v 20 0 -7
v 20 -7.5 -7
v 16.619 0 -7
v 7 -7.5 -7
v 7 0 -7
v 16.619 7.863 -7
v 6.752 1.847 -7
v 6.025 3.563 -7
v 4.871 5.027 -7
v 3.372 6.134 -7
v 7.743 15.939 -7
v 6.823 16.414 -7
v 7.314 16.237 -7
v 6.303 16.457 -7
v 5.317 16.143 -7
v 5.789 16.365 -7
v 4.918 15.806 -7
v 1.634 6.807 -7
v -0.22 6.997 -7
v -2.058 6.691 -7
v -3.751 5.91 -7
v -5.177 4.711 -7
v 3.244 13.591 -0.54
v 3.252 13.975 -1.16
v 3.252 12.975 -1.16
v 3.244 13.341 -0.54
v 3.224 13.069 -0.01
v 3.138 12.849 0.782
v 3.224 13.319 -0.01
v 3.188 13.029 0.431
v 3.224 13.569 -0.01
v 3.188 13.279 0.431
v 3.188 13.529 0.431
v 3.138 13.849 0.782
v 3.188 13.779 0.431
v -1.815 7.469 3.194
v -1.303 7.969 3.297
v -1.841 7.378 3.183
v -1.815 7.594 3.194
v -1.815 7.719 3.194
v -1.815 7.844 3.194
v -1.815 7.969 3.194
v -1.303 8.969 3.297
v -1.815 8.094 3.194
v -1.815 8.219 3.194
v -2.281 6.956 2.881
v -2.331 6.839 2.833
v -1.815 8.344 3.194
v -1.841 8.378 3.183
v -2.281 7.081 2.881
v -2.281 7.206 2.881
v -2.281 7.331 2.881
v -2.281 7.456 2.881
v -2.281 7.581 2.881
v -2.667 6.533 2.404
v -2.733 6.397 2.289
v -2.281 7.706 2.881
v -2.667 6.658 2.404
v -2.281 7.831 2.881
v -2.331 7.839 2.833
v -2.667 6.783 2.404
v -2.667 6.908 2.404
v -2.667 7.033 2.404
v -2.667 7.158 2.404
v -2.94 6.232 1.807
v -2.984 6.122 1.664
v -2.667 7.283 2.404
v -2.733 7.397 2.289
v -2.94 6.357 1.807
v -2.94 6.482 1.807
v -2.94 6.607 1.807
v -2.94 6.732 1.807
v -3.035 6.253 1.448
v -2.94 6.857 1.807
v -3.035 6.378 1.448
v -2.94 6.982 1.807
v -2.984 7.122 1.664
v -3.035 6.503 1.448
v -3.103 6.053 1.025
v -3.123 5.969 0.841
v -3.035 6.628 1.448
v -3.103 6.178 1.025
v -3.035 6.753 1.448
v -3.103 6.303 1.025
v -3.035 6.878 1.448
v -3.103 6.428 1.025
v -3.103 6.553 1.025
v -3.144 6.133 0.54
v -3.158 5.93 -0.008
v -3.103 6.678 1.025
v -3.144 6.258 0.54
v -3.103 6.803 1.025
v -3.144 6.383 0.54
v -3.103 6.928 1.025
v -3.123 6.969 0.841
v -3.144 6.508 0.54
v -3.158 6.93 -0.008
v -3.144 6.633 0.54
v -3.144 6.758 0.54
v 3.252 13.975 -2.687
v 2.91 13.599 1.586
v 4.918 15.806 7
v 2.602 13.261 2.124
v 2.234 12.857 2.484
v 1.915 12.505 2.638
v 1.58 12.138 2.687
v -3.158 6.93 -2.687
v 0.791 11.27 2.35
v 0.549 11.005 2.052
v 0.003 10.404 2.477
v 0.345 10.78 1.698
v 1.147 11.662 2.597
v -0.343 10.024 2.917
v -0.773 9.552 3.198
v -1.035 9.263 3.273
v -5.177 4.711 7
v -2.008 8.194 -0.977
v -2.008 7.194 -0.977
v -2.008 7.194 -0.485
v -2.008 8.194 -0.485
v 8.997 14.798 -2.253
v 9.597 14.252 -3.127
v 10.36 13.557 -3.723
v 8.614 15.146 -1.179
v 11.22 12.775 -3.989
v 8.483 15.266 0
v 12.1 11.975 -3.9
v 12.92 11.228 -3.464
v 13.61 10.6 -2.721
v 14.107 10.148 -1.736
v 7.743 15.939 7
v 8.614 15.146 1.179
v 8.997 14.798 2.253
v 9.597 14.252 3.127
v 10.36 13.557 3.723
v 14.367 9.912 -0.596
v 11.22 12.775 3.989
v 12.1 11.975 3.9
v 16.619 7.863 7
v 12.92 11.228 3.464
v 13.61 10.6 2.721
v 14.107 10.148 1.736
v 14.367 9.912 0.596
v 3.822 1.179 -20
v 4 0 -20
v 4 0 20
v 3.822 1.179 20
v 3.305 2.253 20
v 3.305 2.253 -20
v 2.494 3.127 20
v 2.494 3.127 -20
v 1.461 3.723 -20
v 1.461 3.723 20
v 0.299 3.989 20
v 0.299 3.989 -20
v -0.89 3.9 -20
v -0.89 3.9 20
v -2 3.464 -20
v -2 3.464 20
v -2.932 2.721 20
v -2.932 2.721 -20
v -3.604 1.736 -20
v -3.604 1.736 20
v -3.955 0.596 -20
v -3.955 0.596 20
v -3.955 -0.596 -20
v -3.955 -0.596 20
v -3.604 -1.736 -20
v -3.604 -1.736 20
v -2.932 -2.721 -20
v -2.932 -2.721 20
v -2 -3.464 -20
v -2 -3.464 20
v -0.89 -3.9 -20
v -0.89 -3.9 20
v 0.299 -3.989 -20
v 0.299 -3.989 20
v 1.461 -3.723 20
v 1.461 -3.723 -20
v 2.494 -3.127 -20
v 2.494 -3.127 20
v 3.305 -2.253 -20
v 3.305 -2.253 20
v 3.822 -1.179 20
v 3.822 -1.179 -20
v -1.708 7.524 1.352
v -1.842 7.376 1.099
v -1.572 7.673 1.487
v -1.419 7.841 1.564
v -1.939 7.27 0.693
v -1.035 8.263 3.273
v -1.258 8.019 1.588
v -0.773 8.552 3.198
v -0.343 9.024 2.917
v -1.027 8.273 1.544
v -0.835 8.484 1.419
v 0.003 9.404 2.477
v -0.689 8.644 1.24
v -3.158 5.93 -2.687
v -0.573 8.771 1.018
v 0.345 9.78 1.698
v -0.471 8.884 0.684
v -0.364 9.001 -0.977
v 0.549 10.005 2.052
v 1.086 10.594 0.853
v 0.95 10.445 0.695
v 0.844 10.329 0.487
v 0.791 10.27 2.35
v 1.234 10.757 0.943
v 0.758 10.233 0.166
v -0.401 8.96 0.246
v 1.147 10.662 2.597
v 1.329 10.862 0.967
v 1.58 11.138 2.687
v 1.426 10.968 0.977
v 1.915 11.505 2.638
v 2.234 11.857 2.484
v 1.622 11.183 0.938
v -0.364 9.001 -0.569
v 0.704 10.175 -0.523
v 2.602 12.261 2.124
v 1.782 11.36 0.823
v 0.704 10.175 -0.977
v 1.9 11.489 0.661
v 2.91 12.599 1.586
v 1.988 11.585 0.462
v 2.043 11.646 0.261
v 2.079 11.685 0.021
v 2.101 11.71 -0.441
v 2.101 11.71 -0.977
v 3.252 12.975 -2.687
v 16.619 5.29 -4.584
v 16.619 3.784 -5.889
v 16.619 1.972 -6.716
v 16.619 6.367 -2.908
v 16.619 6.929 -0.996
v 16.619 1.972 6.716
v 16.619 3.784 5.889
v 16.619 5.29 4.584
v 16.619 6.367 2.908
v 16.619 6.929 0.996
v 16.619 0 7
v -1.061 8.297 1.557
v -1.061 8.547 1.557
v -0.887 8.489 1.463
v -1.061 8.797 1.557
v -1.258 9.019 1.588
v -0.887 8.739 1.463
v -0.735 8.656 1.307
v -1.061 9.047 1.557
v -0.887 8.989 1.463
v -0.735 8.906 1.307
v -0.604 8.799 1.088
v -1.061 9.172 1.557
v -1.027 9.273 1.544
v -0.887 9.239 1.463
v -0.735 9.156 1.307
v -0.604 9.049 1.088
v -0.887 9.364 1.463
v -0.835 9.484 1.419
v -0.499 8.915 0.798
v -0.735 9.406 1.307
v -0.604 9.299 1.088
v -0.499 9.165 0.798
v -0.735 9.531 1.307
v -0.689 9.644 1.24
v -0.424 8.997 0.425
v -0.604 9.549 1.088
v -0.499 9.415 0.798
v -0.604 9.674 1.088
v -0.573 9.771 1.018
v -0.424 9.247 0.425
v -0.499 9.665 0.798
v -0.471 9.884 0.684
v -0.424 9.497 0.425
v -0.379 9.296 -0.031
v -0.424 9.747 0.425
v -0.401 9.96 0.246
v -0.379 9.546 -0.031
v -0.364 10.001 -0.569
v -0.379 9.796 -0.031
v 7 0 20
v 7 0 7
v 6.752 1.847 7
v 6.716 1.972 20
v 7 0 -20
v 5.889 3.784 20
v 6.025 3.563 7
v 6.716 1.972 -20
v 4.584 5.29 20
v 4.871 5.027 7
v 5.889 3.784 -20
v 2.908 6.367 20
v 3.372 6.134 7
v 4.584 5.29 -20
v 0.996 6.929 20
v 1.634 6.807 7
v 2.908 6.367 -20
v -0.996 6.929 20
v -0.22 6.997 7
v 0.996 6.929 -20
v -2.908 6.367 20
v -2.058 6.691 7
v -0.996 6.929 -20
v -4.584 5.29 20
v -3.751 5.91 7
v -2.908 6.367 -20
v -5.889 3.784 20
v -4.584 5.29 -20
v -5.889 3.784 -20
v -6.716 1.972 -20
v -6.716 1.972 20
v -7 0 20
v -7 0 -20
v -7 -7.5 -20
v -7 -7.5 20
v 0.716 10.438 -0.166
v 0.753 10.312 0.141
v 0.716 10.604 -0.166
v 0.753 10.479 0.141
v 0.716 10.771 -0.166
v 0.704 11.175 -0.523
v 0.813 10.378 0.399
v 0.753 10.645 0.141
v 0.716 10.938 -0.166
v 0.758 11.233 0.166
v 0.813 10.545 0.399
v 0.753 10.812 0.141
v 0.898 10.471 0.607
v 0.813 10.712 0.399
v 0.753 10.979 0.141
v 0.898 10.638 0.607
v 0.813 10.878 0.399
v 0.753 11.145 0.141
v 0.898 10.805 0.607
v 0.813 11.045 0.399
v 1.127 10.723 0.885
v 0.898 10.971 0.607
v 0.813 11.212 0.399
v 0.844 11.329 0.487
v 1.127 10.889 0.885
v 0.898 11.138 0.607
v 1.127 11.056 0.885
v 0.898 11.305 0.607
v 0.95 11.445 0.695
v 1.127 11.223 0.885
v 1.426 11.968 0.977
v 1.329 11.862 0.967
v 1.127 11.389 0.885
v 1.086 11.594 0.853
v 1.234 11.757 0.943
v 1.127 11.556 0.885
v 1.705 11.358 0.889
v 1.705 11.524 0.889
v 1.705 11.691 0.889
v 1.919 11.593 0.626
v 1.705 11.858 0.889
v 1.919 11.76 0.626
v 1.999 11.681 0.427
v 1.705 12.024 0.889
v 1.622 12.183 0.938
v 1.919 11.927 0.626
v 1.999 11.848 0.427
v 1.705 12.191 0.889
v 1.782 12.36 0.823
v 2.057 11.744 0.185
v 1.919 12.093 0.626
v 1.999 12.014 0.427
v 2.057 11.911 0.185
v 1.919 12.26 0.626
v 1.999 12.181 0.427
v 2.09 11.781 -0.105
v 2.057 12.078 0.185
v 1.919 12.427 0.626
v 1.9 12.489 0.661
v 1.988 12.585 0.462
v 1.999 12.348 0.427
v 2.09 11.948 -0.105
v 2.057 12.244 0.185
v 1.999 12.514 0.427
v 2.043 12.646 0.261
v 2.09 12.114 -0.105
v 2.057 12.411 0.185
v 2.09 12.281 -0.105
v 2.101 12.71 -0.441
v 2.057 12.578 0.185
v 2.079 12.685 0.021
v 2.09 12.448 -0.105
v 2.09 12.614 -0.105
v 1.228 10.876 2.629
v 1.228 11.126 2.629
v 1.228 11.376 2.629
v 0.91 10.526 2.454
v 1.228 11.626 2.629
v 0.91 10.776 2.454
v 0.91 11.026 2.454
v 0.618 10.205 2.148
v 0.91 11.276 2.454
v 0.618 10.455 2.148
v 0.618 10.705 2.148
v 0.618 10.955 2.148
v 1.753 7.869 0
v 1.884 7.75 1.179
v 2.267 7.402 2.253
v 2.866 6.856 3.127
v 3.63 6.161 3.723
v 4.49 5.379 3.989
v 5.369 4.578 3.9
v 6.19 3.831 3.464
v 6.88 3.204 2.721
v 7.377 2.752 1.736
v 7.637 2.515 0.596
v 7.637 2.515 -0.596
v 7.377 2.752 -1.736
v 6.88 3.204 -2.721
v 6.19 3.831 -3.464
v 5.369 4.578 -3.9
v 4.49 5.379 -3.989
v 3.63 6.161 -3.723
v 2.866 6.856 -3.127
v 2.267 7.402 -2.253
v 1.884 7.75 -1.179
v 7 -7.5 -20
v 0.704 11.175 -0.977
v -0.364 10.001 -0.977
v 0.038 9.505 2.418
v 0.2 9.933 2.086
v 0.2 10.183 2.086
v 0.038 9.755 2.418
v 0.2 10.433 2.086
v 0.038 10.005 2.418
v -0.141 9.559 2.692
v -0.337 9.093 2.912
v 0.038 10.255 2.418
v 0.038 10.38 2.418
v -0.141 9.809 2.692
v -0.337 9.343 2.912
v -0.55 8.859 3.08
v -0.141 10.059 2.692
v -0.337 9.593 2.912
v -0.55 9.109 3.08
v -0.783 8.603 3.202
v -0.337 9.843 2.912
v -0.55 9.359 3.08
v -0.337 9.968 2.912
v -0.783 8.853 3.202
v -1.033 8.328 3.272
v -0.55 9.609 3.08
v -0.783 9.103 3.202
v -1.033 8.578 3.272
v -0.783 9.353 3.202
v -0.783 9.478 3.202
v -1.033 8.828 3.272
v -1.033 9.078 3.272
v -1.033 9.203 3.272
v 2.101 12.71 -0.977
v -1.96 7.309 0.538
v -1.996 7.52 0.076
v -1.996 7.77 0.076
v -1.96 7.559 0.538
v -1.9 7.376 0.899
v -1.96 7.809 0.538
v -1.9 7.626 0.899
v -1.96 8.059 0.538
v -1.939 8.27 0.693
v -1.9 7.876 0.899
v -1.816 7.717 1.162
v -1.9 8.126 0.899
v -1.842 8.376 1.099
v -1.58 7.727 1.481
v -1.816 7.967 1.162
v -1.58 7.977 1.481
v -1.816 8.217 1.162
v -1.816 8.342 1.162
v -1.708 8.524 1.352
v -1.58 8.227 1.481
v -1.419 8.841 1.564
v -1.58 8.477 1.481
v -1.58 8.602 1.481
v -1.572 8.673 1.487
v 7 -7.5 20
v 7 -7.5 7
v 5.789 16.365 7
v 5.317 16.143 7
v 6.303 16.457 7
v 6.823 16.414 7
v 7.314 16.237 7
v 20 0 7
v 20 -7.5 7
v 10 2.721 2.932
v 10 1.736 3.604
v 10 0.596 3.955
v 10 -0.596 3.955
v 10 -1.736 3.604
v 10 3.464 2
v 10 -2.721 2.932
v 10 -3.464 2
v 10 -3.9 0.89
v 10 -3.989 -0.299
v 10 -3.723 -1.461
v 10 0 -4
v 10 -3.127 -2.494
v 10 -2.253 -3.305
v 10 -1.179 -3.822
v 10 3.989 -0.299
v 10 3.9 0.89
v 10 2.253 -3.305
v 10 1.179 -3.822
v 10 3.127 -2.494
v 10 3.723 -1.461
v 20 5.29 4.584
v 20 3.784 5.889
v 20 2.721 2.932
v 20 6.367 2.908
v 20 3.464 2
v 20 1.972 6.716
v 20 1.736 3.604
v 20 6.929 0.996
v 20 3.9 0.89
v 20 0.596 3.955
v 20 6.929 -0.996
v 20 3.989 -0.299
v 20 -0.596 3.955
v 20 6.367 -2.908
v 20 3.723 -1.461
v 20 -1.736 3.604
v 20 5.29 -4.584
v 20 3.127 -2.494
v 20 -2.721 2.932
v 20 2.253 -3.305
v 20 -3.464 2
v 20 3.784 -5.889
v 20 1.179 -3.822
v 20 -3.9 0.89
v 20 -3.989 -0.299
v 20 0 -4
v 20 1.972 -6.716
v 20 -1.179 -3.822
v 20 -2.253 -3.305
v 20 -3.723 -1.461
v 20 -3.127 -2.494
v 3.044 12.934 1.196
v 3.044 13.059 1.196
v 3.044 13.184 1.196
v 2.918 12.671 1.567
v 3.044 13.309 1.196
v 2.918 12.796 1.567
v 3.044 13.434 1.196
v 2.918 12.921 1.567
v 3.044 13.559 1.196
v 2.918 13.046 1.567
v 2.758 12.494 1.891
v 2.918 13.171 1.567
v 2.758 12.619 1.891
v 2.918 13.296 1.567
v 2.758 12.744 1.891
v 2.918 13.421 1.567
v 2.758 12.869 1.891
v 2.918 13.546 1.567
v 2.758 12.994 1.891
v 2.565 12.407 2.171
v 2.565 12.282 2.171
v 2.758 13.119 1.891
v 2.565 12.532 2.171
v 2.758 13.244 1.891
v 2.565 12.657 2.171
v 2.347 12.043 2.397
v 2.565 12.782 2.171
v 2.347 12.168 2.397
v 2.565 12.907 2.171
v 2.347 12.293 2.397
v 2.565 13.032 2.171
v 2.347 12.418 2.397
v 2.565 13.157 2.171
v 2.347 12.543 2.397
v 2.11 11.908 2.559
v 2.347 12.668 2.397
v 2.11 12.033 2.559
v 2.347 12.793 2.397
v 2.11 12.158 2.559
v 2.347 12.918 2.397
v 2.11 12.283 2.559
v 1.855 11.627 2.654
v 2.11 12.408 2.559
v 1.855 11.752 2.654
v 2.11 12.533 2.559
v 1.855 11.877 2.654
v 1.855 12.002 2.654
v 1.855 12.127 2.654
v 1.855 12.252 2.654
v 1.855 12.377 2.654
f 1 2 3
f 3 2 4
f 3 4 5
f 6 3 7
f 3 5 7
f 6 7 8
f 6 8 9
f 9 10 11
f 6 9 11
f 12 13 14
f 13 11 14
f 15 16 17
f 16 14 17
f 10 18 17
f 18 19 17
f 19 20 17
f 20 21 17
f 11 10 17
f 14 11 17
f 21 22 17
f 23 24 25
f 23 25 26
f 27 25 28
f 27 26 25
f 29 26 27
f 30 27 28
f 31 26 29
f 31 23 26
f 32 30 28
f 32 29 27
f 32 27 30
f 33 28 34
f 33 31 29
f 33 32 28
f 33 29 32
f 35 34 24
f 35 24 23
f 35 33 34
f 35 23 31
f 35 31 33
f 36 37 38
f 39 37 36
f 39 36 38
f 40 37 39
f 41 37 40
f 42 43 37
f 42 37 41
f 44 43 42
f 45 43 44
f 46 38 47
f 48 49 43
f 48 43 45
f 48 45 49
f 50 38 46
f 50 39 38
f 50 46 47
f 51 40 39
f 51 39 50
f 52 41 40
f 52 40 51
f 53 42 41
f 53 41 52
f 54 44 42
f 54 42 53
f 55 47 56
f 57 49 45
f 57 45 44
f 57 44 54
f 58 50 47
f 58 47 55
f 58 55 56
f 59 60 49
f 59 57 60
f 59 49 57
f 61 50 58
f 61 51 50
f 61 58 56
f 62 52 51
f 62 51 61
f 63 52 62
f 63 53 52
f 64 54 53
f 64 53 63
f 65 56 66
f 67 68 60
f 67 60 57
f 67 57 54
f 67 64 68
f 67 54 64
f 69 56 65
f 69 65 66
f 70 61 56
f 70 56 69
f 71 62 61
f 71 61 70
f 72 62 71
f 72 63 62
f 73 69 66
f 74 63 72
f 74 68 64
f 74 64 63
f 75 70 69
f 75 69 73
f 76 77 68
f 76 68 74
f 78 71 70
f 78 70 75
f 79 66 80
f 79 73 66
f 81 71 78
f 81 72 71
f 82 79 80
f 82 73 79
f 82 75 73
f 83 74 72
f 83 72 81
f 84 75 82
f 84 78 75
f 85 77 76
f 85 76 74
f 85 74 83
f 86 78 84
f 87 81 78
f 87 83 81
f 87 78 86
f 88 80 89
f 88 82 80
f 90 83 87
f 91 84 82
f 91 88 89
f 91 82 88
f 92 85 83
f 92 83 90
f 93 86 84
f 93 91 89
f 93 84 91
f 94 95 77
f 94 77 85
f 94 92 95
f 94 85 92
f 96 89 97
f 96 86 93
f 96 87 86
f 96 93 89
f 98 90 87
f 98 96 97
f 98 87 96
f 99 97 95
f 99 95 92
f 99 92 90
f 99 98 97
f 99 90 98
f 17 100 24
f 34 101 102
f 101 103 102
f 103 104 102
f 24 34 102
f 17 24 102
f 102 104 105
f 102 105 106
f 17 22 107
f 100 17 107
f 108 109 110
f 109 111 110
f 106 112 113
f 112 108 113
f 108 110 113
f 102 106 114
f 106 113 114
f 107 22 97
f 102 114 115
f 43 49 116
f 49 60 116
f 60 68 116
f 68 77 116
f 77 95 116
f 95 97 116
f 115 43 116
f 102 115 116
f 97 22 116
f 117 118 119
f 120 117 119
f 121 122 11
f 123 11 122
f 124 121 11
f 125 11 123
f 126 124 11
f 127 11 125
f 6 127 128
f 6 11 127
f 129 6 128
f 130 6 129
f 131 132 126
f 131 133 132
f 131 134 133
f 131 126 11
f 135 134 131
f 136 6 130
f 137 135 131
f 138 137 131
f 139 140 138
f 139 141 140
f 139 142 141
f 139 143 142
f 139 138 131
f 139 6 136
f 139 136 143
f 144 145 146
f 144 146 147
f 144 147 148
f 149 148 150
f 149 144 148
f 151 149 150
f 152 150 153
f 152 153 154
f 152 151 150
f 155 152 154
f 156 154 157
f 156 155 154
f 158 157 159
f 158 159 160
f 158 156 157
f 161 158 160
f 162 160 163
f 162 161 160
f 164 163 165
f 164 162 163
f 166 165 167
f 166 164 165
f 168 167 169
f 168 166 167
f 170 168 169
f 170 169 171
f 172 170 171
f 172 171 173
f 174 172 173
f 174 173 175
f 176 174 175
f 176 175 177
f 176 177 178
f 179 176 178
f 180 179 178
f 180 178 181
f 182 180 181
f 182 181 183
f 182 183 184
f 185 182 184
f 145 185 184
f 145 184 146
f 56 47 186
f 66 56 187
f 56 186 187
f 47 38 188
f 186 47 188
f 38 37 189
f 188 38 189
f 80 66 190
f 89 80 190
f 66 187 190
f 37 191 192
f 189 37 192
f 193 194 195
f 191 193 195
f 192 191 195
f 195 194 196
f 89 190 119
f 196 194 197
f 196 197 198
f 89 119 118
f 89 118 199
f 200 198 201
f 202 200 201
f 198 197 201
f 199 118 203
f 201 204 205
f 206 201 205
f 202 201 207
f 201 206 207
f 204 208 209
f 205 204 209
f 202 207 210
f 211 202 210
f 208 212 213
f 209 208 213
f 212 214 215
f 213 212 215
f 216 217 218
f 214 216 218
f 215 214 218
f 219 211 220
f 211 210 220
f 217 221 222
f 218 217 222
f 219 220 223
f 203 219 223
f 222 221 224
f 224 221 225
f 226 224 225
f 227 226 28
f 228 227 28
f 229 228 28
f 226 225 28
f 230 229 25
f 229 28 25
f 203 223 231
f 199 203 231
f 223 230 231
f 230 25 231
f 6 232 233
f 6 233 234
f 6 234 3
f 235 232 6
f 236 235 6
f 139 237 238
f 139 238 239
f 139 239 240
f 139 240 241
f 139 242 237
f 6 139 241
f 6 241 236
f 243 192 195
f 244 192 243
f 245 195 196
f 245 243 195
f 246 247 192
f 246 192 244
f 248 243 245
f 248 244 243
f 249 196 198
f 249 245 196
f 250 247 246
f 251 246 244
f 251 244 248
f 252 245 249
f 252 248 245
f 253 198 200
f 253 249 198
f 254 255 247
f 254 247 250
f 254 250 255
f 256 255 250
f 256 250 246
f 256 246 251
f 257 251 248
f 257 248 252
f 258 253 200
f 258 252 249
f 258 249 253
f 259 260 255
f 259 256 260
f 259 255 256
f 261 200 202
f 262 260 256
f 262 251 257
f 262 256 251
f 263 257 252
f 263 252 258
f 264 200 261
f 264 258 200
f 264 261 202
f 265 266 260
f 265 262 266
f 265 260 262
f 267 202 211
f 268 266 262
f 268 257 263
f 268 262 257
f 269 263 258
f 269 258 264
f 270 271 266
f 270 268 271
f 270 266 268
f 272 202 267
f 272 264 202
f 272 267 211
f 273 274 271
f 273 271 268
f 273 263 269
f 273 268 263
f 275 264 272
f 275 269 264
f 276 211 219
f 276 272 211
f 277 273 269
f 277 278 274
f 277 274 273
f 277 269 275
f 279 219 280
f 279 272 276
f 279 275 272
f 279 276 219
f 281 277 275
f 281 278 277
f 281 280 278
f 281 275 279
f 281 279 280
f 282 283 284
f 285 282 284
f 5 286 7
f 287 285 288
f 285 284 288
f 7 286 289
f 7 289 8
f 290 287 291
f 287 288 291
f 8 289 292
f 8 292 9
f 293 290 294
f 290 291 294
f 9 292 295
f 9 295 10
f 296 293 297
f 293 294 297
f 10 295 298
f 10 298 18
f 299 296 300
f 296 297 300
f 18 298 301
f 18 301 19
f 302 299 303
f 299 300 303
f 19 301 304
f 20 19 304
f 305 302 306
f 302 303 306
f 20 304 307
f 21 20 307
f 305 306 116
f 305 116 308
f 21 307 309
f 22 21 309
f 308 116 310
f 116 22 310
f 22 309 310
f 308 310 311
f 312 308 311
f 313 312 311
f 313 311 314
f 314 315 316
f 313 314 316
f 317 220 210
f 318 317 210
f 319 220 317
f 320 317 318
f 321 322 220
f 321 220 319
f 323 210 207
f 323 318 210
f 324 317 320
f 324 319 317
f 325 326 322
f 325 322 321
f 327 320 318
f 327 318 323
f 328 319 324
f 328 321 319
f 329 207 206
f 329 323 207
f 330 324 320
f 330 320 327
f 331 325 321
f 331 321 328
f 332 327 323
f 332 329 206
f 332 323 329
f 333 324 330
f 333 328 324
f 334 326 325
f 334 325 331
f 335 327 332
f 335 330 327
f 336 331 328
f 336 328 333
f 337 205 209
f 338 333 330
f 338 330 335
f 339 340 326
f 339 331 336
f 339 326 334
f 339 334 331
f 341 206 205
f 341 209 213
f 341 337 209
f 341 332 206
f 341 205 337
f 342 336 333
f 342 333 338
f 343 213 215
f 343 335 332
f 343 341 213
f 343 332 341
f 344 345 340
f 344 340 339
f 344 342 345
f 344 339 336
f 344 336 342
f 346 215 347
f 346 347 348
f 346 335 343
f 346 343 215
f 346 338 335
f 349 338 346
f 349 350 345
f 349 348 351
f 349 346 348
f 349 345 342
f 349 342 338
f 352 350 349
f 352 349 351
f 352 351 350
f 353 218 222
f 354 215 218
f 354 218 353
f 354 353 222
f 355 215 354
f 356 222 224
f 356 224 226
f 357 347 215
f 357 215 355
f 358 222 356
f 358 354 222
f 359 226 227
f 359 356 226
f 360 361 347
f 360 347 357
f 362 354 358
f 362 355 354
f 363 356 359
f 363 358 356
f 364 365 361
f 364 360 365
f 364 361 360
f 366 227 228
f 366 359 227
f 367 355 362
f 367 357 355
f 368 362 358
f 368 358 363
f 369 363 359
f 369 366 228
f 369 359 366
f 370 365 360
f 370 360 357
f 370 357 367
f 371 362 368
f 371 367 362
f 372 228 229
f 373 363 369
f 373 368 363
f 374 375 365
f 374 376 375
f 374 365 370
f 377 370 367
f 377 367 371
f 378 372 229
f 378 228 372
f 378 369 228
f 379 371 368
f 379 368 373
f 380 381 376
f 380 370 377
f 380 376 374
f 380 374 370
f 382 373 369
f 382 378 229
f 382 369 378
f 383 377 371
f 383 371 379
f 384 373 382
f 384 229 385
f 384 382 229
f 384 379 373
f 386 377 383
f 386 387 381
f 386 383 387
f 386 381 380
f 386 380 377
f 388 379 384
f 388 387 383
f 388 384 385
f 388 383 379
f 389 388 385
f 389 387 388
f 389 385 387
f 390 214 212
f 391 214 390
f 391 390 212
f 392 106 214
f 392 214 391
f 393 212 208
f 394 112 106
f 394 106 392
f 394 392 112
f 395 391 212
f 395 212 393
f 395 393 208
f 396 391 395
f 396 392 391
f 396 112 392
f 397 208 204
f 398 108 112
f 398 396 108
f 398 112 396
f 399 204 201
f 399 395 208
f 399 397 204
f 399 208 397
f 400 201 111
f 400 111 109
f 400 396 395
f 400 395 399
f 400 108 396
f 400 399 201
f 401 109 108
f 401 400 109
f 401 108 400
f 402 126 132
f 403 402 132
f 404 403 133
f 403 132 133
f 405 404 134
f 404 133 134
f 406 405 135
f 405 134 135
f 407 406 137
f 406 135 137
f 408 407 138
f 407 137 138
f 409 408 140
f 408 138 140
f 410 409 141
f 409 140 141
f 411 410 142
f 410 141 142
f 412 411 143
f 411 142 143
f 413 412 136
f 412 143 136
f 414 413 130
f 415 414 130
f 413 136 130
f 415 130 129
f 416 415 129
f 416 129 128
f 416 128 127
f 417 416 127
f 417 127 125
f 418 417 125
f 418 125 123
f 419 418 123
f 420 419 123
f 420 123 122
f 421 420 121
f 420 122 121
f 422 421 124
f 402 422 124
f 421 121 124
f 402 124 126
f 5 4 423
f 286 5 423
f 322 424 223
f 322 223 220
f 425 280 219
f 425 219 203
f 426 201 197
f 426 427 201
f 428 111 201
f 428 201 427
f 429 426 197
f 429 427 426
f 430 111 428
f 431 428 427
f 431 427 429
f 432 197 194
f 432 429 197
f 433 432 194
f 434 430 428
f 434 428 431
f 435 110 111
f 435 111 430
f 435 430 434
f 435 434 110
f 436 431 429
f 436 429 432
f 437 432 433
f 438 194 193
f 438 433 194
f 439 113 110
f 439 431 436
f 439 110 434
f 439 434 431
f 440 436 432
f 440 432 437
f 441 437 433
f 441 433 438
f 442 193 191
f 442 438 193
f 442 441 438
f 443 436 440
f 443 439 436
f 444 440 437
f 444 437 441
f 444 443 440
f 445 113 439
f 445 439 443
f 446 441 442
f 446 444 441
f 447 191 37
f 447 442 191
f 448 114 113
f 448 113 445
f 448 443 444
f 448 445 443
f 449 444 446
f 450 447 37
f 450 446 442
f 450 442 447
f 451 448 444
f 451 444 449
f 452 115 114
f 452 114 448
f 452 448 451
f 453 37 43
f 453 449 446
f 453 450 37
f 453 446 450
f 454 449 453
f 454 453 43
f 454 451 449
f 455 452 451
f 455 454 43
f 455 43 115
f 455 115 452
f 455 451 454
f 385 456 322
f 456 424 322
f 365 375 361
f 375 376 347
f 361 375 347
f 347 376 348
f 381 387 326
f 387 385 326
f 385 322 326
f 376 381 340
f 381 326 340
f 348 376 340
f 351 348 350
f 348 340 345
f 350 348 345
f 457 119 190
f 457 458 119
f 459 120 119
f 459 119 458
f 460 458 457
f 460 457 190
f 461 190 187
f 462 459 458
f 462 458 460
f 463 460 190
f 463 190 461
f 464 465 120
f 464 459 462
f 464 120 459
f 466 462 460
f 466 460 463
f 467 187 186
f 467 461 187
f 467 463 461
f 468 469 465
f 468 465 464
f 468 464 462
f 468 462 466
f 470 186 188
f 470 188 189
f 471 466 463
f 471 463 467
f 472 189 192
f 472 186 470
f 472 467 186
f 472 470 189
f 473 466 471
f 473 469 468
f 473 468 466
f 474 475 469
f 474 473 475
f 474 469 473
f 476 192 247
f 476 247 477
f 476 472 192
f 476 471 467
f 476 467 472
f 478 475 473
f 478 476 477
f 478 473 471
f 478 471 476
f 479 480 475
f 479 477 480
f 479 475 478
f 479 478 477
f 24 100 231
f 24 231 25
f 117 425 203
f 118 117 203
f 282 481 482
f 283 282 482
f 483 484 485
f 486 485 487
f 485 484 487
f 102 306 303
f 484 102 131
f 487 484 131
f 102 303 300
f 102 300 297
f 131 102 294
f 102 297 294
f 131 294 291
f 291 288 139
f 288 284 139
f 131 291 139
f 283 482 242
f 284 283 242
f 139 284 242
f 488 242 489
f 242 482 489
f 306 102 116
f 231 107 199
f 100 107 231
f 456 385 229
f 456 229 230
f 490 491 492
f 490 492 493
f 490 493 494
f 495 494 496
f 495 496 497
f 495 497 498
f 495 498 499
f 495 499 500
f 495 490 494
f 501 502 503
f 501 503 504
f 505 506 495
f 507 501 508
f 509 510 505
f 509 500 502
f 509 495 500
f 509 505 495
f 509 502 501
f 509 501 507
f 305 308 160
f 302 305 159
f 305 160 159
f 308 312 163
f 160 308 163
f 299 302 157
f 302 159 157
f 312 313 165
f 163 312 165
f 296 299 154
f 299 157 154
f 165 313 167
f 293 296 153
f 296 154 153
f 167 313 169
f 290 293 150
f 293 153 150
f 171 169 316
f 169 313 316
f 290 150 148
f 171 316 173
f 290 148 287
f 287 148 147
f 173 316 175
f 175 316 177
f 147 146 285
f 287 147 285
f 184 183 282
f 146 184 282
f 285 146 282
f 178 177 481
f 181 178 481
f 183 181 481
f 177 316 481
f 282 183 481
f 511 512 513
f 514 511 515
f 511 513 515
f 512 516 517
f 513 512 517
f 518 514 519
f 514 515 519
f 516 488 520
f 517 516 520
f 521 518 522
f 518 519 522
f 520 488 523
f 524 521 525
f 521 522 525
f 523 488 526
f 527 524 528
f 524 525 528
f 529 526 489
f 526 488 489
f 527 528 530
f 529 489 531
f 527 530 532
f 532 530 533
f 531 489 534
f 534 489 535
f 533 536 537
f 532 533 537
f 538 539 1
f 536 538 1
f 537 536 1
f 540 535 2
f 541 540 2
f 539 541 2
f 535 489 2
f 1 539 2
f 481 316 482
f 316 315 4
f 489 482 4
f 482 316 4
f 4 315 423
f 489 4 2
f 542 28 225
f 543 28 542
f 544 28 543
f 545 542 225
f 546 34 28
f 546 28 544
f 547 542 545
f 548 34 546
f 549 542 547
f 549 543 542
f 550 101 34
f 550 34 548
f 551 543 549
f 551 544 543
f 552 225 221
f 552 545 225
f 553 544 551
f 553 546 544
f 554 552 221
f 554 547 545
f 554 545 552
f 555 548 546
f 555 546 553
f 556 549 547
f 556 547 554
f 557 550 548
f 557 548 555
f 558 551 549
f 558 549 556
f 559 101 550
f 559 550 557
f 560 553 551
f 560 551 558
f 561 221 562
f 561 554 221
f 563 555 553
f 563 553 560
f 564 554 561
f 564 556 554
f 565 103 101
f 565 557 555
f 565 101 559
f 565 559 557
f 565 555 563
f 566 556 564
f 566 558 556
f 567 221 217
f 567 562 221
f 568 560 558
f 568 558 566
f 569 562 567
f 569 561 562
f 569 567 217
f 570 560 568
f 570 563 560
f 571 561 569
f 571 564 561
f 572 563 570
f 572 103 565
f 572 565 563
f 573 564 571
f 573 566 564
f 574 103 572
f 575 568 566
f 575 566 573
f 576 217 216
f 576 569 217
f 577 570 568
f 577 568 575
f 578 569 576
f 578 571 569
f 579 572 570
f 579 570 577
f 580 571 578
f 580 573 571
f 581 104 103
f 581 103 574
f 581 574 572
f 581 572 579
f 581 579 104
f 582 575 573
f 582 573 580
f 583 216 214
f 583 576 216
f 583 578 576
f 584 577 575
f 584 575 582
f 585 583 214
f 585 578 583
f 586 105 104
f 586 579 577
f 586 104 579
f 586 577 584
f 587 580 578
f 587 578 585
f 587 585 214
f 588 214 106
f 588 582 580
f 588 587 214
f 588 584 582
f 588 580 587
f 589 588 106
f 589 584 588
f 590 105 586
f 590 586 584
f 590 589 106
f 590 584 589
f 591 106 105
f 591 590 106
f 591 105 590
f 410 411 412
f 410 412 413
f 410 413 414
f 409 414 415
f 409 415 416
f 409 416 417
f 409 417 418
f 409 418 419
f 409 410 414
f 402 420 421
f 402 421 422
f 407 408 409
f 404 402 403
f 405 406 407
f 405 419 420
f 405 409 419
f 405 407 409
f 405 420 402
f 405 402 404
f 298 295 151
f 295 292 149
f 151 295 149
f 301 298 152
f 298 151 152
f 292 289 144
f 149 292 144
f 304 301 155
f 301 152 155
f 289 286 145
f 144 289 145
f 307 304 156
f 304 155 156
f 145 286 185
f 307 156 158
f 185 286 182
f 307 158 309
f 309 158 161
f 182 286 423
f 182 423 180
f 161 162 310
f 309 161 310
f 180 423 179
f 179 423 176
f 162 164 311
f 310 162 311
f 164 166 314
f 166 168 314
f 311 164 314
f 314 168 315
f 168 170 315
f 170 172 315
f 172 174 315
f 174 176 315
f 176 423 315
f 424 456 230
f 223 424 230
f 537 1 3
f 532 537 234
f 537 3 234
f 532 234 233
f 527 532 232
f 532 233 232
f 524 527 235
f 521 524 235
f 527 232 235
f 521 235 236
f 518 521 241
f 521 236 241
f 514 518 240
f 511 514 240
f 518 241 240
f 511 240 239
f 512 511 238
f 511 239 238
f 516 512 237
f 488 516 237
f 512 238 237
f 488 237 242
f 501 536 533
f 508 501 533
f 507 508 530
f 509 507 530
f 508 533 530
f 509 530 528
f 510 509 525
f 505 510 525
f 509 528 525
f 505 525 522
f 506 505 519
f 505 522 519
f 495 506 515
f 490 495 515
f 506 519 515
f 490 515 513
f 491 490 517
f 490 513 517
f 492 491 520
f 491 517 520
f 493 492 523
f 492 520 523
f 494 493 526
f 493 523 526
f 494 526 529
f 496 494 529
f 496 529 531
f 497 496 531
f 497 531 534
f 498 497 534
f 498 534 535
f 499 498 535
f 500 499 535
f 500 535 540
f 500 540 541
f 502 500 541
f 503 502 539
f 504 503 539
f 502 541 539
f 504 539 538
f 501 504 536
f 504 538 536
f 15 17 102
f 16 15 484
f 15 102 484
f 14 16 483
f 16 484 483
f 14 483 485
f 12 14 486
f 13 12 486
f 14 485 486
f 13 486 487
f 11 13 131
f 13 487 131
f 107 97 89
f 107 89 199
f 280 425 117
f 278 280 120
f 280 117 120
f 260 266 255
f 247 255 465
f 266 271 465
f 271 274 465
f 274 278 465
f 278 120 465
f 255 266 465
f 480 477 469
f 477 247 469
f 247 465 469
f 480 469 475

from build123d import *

# Parameters (mm, degrees)
DODANIE_WYCI_GNI_CIE1_DEPTH             = 20
DODANIE_WYCI_GNI_CIE1_DEPTH_BACK        = 20
SZKIC1_R                                = 7
SZKIC1_R_2                              = 4
DODANIE_WYCI_GNI_CIE2_DEPTH             = 10
DODANIE_WYCI_GNI_CIE2_DEPTH_BACK        = 10
SZKIC2_R                                = 4
DODANIE_WYCI_GNI_CIE4_REACH             = 28.181
DODANIE_WYCI_GNI_CIE4_END_RADIUS        = 7
SZKIC3_W                                = 14
SZKIC3_H                                = 14
DODANIE_WYCI_GNI_CIE4_DIRECTION_2_DEPTH = 10
SZKIC9_R                                = 7
DODANIE_WYCI_GNI_CIE6_DEPTH             = 20
DODANIE_WYCI_GNI_CIE5_REACH             = 39.607
SZKIC12_R                               = 4
WYTNIJ_WYCI_GNI_CIE3_DEPTH              = 40.984557912
DODANIE_WYCI_GNI_CIE7_START             = 8
DODANIE_WYCI_GNI_CIE7_DEPTH             = 8.618630395
SZKIC4_R                                = 4
WYTNIJ_WYCI_GNI_CIE1_DEPTH              = 10
SZKIC10_R                               = 4
WYTNIJ_WYCI_GNI_CIE2_DEPTH              = 10
ZAOKR_GLENIE1_R                         = 2
WYTNIJ_WYCI_GNI_CIE4_DEPTH              = 1


with BuildPart() as part:
    # Szkic1 → Dodanie-wyciągnięcie1 (new, two sides: drawn at the far end of the back side and taken through both)
    with BuildSketch(Plane.XY.offset(-DODANIE_WYCI_GNI_CIE1_DEPTH_BACK)):
        Circle(SZKIC1_R)
        Circle(SZKIC1_R_2, mode=Mode.SUBTRACT)
    extrude(amount=DODANIE_WYCI_GNI_CIE1_DEPTH + DODANIE_WYCI_GNI_CIE1_DEPTH_BACK)

    # Szkic2 → Dodanie-wyciągnięcie2 (add, two sides: drawn at the far end of the back side and taken through both)
    with BuildSketch(Plane.XY.offset(-DODANIE_WYCI_GNI_CIE2_DEPTH_BACK)):
        Circle(SZKIC2_R)
    extrude(amount=DODANIE_WYCI_GNI_CIE2_DEPTH + DODANIE_WYCI_GNI_CIE2_DEPTH_BACK)

    # Dodanie-wyciągnięcie4: up to this cylinder (the profile starts outside it)
    dodanie_wyci_gni_cie4_end = Plane(origin=(0, 0, 0), z_dir=(0, 0, 1)) * Cylinder(DODANIE_WYCI_GNI_CIE4_END_RADIUS, 71.362, mode=Mode.PRIVATE)
    # Szkic3 → Dodanie-wyciągnięcie4 (add, up to the surface)
    with BuildSketch(Plane(origin=(4.711087595, 5.177417665, 0), x_dir=(0, 0, 1), z_dir=(0.6730125135097745, 0.7396310949786087, 0)), mode=Mode.PRIVATE) as dodanie_wyci_gni_cie4_sk1:
        Rectangle(SZKIC3_W, SZKIC3_H)
    dodanie_wyci_gni_cie4_tool1 = extrude(dodanie_wyci_gni_cie4_sk1.sketch, amount=-DODANIE_WYCI_GNI_CIE4_REACH, mode=Mode.PRIVATE) - dodanie_wyci_gni_cie4_end
    add(dodanie_wyci_gni_cie4_tool1.solids().sort_by_distance((4.711088, 5.177418, 0))[0])
    add(dodanie_wyci_gni_cie4_tool1.solids().sort_by_distance((4.711088, 5.177418, 0))[1])

    # Szkic3 → Dodanie-wyciągnięcie4 direction 2 (add)
    with BuildSketch(Plane(origin=(4.711087595, 5.177417665, 0), x_dir=(0, 0, 1), z_dir=(0.6730125135097745, 0.7396310949786087, 0))):
        Rectangle(SZKIC3_W, SZKIC3_H)
    extrude(amount=DODANIE_WYCI_GNI_CIE4_DIRECTION_2_DEPTH)

    # Szkic9 → Dodanie-wyciągnięcie6 (add)
    with BuildSketch(Plane(origin=(0, 0, 0), x_dir=(0, 0, -1), z_dir=(1, 0, 0))):
        Circle(SZKIC9_R)
    extrude(amount=DODANIE_WYCI_GNI_CIE6_DEPTH)

    # Szkic8 → Dodanie-wyciągnięcie5 (add, up to next)
    with BuildSketch(Plane(origin=(0, -7.5, 0), x_dir=(1, 0, 0), z_dir=(0, 1, 0)), mode=Mode.PRIVATE) as dodanie_wyci_gni_cie5_sk1:
        Polygon((7, 20), (-7, 20), (-7, -20), (7, -20), (7, -7), (20, -7), (20, 7), (7, 7), align=None)
    dodanie_wyci_gni_cie5_tool1 = extrude(dodanie_wyci_gni_cie5_sk1.sketch, amount=DODANIE_WYCI_GNI_CIE5_REACH, mode=Mode.PRIVATE) - part.part
    add(dodanie_wyci_gni_cie5_tool1.solids().sort_by_distance((3.311321, -7.5, 0))[0])

    # Szkic12 → Wytnij-wyciągnięcie3 (cut, through all)
    with BuildSketch(Plane.XY.offset(10)):
        Circle(SZKIC12_R)
    extrude(amount=-WYTNIJ_WYCI_GNI_CIE3_DEPTH, mode=Mode.SUBTRACT)

    # Dodanie-wyciągnięcie7: read off the stored shape, not the designer's step
    # Dodanie-wyciągnięcie7 outline → Dodanie-wyciągnięcie7 (add)
    with BuildSketch(Plane.YZ.offset(DODANIE_WYCI_GNI_CIE7_START)):
        with BuildLine():
            Line((7.86264102, 7), (0, 7))
            ThreePointArc((0, 7), (7, 0), (0, -7))
            Line((0, -7), (7.86264102, -7))
            Line((7.86264102, -7), (7.86264102, 7))
        make_face()
    extrude(amount=DODANIE_WYCI_GNI_CIE7_DEPTH)

    # Szkic4 → Wytnij-wyciągnięcie1 (cut)
    with BuildSketch(Plane(origin=(11.44121273, 12.573728615, 0), x_dir=(0, 0, -1), z_dir=(0.6730125135097745, 0.7396310949786088, 0))):
        with Locations(Location((0, 0, 0), (0, 0, 90))):
            Circle(SZKIC4_R)
    extrude(amount=-WYTNIJ_WYCI_GNI_CIE1_DEPTH, mode=Mode.SUBTRACT)

    # Szkic10 → Wytnij-wyciągnięcie2 (cut)
    with BuildSketch(Plane(origin=(20, 0, 0), x_dir=(0, 0, -1), z_dir=(1, 0, 0))):
        Circle(SZKIC10_R)
    extrude(amount=-WYTNIJ_WYCI_GNI_CIE2_DEPTH, mode=Mode.SUBTRACT)

    # Zaokrąglenie1
    zaokr_glenie1_edges = [part.edges().sort_by_distance(p)[0] for p in [
        (6.263795065, 17.284816209, 0),
    ]]
    fillet(zaokr_glenie1_edges, radius=ZAOKR_GLENIE1_R)

    # Szkic14 → Wytnij-wyciągnięcie4 (cut, along a direction that is not the sketch's normal)
    with BuildSketch(Plane(origin=(-5.177417665, 4.711087595, 0), x_dir=(0, 0, 1), z_dir=(-0.7396310949786086, 0.6730125135097746, 0))):
        with BuildLine():
            Line((-2.686538462, 3), (-2.686538462, 12.525))
            Line((-2.686538462, 12.525), (-1.160096154, 12.525))
            add(Edge.make_bspline(
                [(-1.160096154, 12.525), (-1.053235648, 12.525012195), (-0.846462595, 12.525035793), (-0.548143042, 12.51455979), (-0.271476851, 12.501007906), (-0.01734448, 12.4858465), (0.214686622, 12.459720367), (0.424263612, 12.432186277), (0.611805228, 12.398981861), (0.727752018, 12.369196471), (0.782301683, 12.355183293)],
                knots=[0, 0, 0, 0, 1.311965854, 2.538629056, 3.664479157, 4.713267157, 5.663616078, 6.530575999, 7.308677837, 8, 8, 8, 8], degree=3))
            add(Edge.make_bspline(
                [(0.782301683, 12.355183293), (0.85393093, 12.335417456), (0.994490509, 12.296630538), (1.195816681, 12.218298682), (1.386802639, 12.131227269), (1.567215194, 12.031895073), (1.735946541, 11.919102874), (1.892355443, 11.79195552), (2.039815254, 11.655556701), (2.173090012, 11.50610502), (2.293548434, 11.348181634), (2.398205206, 11.181827924), (2.489138527, 11.009587547), (2.561909002, 10.829292972), (2.616740188, 10.641774504), (2.656843488, 10.447832876), (2.682835858, 10.24685441), (2.685291796, 10.11012219), (2.686538462, 10.040715144)],
                knots=[0, 0, 0, 0, 1.099996261, 2.158545794, 3.195537121, 4.207578794, 5.205712374, 6.197378256, 7.190519799, 8.17788031, 9.159561366, 10.129234751, 11.085776129, 12.040971148, 13.00380137, 13.975669004, 14.972423361, 16, 16, 16, 16], degree=3))
            add(Edge.make_bspline(
                [(2.686538462, 10.040715144), (2.6832788, 9.951545308), (2.676862558, 9.776025442), (2.635875166, 9.518218515), (2.559017418, 9.274553912), (2.458450925, 9.040540989), (2.321711936, 8.817052614), (2.148079865, 8.604195051), (1.940366984, 8.395414096), (1.781039737, 8.270263996), (1.698167067, 8.205168269)],
                knots=[0, 0, 0, 0, 0.986156485, 1.941127874, 2.875419072, 3.804401753, 4.751181392, 5.761612777, 6.835722519, 8, 8, 8, 8], degree=3))
            add(Edge.make_bspline(
                [(1.698167067, 8.205168269), (1.765323103, 8.170885695), (1.89699751, 8.103667053), (2.083936483, 7.99317967), (2.257021567, 7.875662326), (2.417028822, 7.753479516), (2.560601912, 7.621451735), (2.693669212, 7.487186605), (2.809665872, 7.342991291), (2.913393581, 7.194005189), (3.00355202, 7.038070964), (3.082070078, 6.875451953), (3.148391466, 6.705592614), (3.204554132, 6.529357394), (3.246440263, 6.346140126), (3.273750912, 6.155875284), (3.294661651, 5.959211768), (3.29628831, 5.825249491), (3.297115385, 5.757136418)],
                knots=[0, 0, 0, 0, 1.164658916, 2.283573913, 3.35186032, 4.395461096, 5.390182219, 6.362969632, 7.312859996, 8.245001507, 9.165155236, 10.092416118, 11.032087915, 11.979892451, 12.947605196, 13.931445124, 14.948243989, 16, 16, 16, 16], degree=3))
            add(Edge.make_bspline(
                [(3.297115385, 5.757136418), (3.291748226, 5.627044343), (3.281156159, 5.370308155), (3.203712138, 4.993360467), (3.069448812, 4.63597987), (2.889160851, 4.299586747), (2.667011396, 3.993919126), (2.411603228, 3.726156945), (2.125507722, 3.499502202), (1.861550038, 3.346527834), (1.633247428, 3.243867728), (1.444148642, 3.180396777), (1.241060554, 3.121597384), (1.020263078, 3.080307236), (0.785758971, 3.042513952), (0.535261803, 3.019179595), (0.26923975, 3.003366477), (0.086524304, 3.001144846), (-0.007632212, 3)],
                knots=[0, 0, 0, 0, 1.284142165, 2.534249414, 3.780121997, 5.041676246, 6.291546858, 7.49970053, 8.684500223, 9.883330709, 10.50184324, 11.153274765, 11.851151195, 12.587658647, 13.369265475, 14.195992086, 15.070362669, 16, 16, 16, 16], degree=3))
            Line((-0.007632212, 3), (-2.686538462, 3))
        make_face()
        with BuildLine():
            Line((-0.976923077, 10.815384615), (-0.976923077, 8.739423077))
            Line((-0.976923077, 8.739423077), (-0.52280649, 8.739423077))
            add(Edge.make_bspline(
                [(-0.52280649, 8.739423077), (-0.461087966, 8.739961286), (-0.341944091, 8.741000265), (-0.1698534, 8.754381963), (-0.009836849, 8.77721197), (0.137498653, 8.809065573), (0.273525591, 8.849515004), (0.397374985, 8.898184382), (0.508502292, 8.957566312), (0.63760652, 9.046018318), (0.774079, 9.176179404), (0.894214189, 9.364224061), (0.964973013, 9.580474702), (0.972853637, 9.732991398), (0.976923077, 9.811748798)],
                knots=[0, 0, 0, 0, 1.065314748, 2.056525647, 2.977365736, 3.853934255, 4.656397591, 5.425096493, 6.14721249, 6.826394842, 8.123232004, 9.372140726, 10.643011755, 12, 12, 12, 12], degree=3))
            add(Edge.make_bspline(
                [(0.976923077, 9.811748798), (0.97366678, 9.885518189), (0.967370861, 10.028148341), (0.896125823, 10.228413777), (0.785468194, 10.40588994), (0.654821309, 10.527357859), (0.531791881, 10.610316867), (0.426446534, 10.664941841), (0.310822106, 10.71384156), (0.18268023, 10.751231476), (0.042752669, 10.779287553), (-0.108280873, 10.799891382), (-0.27068098, 10.813915224), (-0.382851079, 10.814884312), (-0.440760216, 10.815384615)],
                knots=[0, 0, 0, 0, 1.347982417, 2.606269829, 3.849316587, 5.153353503, 5.842674298, 6.568177932, 7.326619318, 8.142485038, 9.012069166, 9.942760135, 10.937925643, 12, 12, 12, 12], degree=3))
            Line((-0.440760216, 10.815384615), (-0.976923077, 10.815384615))
        make_face(mode=Mode.SUBTRACT)
        with BuildLine():
            Line((-0.976923077, 7.151923077), (-0.976923077, 4.709615385))
            Line((-0.976923077, 4.709615385), (-0.484645433, 4.709615385))
            add(Edge.make_bspline(
                [(-0.484645433, 4.709615385), (-0.387321516, 4.710171393), (-0.200204141, 4.711240387), (0.067841168, 4.724156384), (0.311561364, 4.747435193), (0.530310682, 4.776496911), (0.724424178, 4.815870993), (0.893245702, 4.865930091), (1.039090422, 4.921003819), (1.161083845, 4.989026413), (1.260745483, 5.068187842), (1.350679663, 5.149092725), (1.424006389, 5.242424151), (1.482023863, 5.344175661), (1.532237884, 5.451819674), (1.562523436, 5.569559649), (1.585581792, 5.693906057), (1.586850755, 5.779913778), (1.5875, 5.823918269)],
                knots=[0, 0, 0, 0, 1.753078804, 3.370512758, 4.83203934, 6.162291463, 7.344201807, 8.395507345, 9.331626367, 10.147333109, 10.898971645, 11.62040215, 12.321813352, 13.025280112, 13.727906689, 14.453419512, 15.208716525, 16, 16, 16, 16], degree=3))
            add(Edge.make_bspline(
                [(1.5875, 5.823918269), (1.586068229, 5.874238098), (1.583279523, 5.972247587), (1.560504132, 6.115498915), (1.519113807, 6.249233534), (1.466980673, 6.37687122), (1.394434648, 6.493842097), (1.308216175, 6.604194086), (1.204042251, 6.704190327), (1.086892595, 6.799878966), (0.95024912, 6.883659553), (0.794047716, 6.956354053), (0.617439814, 7.017065822), (0.41987835, 7.065404572), (0.202229419, 7.106429001), (-0.037095577, 7.130925114), (-0.296103456, 7.14914395), (-0.475703734, 7.150975652), (-0.56859976, 7.151923077)],
                knots=[0, 0, 0, 0, 0.845221588, 1.646264278, 2.427170338, 3.19324141, 3.95557735, 4.731569926, 5.540061037, 6.376114724, 7.268642756, 8.224665384, 9.265483498, 10.400594375, 11.639216012, 12.983232105, 14.439614077, 16, 16, 16, 16], degree=3))
            Line((-0.56859976, 7.151923077), (-0.976923077, 7.151923077))
        make_face(mode=Mode.SUBTRACT)
    extrude(amount=-WYTNIJ_WYCI_GNI_CIE4_DEPTH, dir=(0, 1, 0), mode=Mode.SUBTRACT)


solid = part.part
